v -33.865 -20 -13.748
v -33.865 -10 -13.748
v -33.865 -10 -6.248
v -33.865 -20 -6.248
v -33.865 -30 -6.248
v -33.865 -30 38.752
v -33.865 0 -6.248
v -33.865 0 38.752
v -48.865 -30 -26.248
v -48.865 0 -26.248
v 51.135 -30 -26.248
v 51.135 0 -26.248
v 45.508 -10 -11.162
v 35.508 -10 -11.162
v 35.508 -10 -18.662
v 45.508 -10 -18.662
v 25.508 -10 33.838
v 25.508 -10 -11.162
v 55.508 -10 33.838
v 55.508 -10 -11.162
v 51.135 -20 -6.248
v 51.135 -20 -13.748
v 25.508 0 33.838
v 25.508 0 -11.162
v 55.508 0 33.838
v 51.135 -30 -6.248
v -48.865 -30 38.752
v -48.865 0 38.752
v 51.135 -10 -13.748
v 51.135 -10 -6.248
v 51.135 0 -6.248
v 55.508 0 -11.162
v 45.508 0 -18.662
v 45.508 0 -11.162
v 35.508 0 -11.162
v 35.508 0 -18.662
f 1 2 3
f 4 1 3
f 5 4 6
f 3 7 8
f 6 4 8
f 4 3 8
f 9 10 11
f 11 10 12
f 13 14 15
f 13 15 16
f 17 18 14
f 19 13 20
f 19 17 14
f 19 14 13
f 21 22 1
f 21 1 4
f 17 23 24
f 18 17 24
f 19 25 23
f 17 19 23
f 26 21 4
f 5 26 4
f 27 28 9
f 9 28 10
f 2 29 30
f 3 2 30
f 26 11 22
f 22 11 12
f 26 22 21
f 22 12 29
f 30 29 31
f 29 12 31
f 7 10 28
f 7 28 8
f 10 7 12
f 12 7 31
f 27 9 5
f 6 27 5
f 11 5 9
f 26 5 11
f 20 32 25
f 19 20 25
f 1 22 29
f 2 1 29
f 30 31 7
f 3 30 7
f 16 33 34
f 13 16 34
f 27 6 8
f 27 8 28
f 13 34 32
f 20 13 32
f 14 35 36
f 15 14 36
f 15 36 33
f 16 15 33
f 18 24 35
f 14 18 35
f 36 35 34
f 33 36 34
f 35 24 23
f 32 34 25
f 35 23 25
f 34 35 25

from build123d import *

# Parameters (mm, degrees)
F1_DEPTH = 30
F3_DEPTH = 10
F4_W     = 10
F4_H     = 7.5
F5_DEPTH = 85


with BuildPart() as f1:
    # F0 (on Front) → F1 (new body)
    with BuildSketch(Plane.XZ):
        Polygon((-33.864659, 38.752251), (-48.864659, 38.752251), (-48.864659, -26.247749), (51.135341, -26.247749), (51.135341, -6.247749), (-33.864659, -6.247749), align=None)
    extrude(amount=F1_DEPTH)

    # F4 (on face) → F5 (cut)
    with BuildSketch(Plane.YZ.offset(51.135341)):
        with Locations((-15, -9.997749)):
            Rectangle(F4_W, F4_H)
    extrude(amount=-F5_DEPTH, mode=Mode.SUBTRACT)


with BuildPart() as f3:
    # F2 (on Front) → F3 (new body)
    with BuildSketch(Plane.XZ):
        Polygon((55.508092, 33.837681), (25.508092, 33.837681), (25.508092, -11.162319), (35.508092, -11.162319), (35.508092, -18.662319), (45.508092, -18.662319), (45.508092, -11.162319), (55.508092, -11.162319), align=None)
    extrude(amount=F3_DEPTH)


solid = Compound([f1.part, f3.part])
